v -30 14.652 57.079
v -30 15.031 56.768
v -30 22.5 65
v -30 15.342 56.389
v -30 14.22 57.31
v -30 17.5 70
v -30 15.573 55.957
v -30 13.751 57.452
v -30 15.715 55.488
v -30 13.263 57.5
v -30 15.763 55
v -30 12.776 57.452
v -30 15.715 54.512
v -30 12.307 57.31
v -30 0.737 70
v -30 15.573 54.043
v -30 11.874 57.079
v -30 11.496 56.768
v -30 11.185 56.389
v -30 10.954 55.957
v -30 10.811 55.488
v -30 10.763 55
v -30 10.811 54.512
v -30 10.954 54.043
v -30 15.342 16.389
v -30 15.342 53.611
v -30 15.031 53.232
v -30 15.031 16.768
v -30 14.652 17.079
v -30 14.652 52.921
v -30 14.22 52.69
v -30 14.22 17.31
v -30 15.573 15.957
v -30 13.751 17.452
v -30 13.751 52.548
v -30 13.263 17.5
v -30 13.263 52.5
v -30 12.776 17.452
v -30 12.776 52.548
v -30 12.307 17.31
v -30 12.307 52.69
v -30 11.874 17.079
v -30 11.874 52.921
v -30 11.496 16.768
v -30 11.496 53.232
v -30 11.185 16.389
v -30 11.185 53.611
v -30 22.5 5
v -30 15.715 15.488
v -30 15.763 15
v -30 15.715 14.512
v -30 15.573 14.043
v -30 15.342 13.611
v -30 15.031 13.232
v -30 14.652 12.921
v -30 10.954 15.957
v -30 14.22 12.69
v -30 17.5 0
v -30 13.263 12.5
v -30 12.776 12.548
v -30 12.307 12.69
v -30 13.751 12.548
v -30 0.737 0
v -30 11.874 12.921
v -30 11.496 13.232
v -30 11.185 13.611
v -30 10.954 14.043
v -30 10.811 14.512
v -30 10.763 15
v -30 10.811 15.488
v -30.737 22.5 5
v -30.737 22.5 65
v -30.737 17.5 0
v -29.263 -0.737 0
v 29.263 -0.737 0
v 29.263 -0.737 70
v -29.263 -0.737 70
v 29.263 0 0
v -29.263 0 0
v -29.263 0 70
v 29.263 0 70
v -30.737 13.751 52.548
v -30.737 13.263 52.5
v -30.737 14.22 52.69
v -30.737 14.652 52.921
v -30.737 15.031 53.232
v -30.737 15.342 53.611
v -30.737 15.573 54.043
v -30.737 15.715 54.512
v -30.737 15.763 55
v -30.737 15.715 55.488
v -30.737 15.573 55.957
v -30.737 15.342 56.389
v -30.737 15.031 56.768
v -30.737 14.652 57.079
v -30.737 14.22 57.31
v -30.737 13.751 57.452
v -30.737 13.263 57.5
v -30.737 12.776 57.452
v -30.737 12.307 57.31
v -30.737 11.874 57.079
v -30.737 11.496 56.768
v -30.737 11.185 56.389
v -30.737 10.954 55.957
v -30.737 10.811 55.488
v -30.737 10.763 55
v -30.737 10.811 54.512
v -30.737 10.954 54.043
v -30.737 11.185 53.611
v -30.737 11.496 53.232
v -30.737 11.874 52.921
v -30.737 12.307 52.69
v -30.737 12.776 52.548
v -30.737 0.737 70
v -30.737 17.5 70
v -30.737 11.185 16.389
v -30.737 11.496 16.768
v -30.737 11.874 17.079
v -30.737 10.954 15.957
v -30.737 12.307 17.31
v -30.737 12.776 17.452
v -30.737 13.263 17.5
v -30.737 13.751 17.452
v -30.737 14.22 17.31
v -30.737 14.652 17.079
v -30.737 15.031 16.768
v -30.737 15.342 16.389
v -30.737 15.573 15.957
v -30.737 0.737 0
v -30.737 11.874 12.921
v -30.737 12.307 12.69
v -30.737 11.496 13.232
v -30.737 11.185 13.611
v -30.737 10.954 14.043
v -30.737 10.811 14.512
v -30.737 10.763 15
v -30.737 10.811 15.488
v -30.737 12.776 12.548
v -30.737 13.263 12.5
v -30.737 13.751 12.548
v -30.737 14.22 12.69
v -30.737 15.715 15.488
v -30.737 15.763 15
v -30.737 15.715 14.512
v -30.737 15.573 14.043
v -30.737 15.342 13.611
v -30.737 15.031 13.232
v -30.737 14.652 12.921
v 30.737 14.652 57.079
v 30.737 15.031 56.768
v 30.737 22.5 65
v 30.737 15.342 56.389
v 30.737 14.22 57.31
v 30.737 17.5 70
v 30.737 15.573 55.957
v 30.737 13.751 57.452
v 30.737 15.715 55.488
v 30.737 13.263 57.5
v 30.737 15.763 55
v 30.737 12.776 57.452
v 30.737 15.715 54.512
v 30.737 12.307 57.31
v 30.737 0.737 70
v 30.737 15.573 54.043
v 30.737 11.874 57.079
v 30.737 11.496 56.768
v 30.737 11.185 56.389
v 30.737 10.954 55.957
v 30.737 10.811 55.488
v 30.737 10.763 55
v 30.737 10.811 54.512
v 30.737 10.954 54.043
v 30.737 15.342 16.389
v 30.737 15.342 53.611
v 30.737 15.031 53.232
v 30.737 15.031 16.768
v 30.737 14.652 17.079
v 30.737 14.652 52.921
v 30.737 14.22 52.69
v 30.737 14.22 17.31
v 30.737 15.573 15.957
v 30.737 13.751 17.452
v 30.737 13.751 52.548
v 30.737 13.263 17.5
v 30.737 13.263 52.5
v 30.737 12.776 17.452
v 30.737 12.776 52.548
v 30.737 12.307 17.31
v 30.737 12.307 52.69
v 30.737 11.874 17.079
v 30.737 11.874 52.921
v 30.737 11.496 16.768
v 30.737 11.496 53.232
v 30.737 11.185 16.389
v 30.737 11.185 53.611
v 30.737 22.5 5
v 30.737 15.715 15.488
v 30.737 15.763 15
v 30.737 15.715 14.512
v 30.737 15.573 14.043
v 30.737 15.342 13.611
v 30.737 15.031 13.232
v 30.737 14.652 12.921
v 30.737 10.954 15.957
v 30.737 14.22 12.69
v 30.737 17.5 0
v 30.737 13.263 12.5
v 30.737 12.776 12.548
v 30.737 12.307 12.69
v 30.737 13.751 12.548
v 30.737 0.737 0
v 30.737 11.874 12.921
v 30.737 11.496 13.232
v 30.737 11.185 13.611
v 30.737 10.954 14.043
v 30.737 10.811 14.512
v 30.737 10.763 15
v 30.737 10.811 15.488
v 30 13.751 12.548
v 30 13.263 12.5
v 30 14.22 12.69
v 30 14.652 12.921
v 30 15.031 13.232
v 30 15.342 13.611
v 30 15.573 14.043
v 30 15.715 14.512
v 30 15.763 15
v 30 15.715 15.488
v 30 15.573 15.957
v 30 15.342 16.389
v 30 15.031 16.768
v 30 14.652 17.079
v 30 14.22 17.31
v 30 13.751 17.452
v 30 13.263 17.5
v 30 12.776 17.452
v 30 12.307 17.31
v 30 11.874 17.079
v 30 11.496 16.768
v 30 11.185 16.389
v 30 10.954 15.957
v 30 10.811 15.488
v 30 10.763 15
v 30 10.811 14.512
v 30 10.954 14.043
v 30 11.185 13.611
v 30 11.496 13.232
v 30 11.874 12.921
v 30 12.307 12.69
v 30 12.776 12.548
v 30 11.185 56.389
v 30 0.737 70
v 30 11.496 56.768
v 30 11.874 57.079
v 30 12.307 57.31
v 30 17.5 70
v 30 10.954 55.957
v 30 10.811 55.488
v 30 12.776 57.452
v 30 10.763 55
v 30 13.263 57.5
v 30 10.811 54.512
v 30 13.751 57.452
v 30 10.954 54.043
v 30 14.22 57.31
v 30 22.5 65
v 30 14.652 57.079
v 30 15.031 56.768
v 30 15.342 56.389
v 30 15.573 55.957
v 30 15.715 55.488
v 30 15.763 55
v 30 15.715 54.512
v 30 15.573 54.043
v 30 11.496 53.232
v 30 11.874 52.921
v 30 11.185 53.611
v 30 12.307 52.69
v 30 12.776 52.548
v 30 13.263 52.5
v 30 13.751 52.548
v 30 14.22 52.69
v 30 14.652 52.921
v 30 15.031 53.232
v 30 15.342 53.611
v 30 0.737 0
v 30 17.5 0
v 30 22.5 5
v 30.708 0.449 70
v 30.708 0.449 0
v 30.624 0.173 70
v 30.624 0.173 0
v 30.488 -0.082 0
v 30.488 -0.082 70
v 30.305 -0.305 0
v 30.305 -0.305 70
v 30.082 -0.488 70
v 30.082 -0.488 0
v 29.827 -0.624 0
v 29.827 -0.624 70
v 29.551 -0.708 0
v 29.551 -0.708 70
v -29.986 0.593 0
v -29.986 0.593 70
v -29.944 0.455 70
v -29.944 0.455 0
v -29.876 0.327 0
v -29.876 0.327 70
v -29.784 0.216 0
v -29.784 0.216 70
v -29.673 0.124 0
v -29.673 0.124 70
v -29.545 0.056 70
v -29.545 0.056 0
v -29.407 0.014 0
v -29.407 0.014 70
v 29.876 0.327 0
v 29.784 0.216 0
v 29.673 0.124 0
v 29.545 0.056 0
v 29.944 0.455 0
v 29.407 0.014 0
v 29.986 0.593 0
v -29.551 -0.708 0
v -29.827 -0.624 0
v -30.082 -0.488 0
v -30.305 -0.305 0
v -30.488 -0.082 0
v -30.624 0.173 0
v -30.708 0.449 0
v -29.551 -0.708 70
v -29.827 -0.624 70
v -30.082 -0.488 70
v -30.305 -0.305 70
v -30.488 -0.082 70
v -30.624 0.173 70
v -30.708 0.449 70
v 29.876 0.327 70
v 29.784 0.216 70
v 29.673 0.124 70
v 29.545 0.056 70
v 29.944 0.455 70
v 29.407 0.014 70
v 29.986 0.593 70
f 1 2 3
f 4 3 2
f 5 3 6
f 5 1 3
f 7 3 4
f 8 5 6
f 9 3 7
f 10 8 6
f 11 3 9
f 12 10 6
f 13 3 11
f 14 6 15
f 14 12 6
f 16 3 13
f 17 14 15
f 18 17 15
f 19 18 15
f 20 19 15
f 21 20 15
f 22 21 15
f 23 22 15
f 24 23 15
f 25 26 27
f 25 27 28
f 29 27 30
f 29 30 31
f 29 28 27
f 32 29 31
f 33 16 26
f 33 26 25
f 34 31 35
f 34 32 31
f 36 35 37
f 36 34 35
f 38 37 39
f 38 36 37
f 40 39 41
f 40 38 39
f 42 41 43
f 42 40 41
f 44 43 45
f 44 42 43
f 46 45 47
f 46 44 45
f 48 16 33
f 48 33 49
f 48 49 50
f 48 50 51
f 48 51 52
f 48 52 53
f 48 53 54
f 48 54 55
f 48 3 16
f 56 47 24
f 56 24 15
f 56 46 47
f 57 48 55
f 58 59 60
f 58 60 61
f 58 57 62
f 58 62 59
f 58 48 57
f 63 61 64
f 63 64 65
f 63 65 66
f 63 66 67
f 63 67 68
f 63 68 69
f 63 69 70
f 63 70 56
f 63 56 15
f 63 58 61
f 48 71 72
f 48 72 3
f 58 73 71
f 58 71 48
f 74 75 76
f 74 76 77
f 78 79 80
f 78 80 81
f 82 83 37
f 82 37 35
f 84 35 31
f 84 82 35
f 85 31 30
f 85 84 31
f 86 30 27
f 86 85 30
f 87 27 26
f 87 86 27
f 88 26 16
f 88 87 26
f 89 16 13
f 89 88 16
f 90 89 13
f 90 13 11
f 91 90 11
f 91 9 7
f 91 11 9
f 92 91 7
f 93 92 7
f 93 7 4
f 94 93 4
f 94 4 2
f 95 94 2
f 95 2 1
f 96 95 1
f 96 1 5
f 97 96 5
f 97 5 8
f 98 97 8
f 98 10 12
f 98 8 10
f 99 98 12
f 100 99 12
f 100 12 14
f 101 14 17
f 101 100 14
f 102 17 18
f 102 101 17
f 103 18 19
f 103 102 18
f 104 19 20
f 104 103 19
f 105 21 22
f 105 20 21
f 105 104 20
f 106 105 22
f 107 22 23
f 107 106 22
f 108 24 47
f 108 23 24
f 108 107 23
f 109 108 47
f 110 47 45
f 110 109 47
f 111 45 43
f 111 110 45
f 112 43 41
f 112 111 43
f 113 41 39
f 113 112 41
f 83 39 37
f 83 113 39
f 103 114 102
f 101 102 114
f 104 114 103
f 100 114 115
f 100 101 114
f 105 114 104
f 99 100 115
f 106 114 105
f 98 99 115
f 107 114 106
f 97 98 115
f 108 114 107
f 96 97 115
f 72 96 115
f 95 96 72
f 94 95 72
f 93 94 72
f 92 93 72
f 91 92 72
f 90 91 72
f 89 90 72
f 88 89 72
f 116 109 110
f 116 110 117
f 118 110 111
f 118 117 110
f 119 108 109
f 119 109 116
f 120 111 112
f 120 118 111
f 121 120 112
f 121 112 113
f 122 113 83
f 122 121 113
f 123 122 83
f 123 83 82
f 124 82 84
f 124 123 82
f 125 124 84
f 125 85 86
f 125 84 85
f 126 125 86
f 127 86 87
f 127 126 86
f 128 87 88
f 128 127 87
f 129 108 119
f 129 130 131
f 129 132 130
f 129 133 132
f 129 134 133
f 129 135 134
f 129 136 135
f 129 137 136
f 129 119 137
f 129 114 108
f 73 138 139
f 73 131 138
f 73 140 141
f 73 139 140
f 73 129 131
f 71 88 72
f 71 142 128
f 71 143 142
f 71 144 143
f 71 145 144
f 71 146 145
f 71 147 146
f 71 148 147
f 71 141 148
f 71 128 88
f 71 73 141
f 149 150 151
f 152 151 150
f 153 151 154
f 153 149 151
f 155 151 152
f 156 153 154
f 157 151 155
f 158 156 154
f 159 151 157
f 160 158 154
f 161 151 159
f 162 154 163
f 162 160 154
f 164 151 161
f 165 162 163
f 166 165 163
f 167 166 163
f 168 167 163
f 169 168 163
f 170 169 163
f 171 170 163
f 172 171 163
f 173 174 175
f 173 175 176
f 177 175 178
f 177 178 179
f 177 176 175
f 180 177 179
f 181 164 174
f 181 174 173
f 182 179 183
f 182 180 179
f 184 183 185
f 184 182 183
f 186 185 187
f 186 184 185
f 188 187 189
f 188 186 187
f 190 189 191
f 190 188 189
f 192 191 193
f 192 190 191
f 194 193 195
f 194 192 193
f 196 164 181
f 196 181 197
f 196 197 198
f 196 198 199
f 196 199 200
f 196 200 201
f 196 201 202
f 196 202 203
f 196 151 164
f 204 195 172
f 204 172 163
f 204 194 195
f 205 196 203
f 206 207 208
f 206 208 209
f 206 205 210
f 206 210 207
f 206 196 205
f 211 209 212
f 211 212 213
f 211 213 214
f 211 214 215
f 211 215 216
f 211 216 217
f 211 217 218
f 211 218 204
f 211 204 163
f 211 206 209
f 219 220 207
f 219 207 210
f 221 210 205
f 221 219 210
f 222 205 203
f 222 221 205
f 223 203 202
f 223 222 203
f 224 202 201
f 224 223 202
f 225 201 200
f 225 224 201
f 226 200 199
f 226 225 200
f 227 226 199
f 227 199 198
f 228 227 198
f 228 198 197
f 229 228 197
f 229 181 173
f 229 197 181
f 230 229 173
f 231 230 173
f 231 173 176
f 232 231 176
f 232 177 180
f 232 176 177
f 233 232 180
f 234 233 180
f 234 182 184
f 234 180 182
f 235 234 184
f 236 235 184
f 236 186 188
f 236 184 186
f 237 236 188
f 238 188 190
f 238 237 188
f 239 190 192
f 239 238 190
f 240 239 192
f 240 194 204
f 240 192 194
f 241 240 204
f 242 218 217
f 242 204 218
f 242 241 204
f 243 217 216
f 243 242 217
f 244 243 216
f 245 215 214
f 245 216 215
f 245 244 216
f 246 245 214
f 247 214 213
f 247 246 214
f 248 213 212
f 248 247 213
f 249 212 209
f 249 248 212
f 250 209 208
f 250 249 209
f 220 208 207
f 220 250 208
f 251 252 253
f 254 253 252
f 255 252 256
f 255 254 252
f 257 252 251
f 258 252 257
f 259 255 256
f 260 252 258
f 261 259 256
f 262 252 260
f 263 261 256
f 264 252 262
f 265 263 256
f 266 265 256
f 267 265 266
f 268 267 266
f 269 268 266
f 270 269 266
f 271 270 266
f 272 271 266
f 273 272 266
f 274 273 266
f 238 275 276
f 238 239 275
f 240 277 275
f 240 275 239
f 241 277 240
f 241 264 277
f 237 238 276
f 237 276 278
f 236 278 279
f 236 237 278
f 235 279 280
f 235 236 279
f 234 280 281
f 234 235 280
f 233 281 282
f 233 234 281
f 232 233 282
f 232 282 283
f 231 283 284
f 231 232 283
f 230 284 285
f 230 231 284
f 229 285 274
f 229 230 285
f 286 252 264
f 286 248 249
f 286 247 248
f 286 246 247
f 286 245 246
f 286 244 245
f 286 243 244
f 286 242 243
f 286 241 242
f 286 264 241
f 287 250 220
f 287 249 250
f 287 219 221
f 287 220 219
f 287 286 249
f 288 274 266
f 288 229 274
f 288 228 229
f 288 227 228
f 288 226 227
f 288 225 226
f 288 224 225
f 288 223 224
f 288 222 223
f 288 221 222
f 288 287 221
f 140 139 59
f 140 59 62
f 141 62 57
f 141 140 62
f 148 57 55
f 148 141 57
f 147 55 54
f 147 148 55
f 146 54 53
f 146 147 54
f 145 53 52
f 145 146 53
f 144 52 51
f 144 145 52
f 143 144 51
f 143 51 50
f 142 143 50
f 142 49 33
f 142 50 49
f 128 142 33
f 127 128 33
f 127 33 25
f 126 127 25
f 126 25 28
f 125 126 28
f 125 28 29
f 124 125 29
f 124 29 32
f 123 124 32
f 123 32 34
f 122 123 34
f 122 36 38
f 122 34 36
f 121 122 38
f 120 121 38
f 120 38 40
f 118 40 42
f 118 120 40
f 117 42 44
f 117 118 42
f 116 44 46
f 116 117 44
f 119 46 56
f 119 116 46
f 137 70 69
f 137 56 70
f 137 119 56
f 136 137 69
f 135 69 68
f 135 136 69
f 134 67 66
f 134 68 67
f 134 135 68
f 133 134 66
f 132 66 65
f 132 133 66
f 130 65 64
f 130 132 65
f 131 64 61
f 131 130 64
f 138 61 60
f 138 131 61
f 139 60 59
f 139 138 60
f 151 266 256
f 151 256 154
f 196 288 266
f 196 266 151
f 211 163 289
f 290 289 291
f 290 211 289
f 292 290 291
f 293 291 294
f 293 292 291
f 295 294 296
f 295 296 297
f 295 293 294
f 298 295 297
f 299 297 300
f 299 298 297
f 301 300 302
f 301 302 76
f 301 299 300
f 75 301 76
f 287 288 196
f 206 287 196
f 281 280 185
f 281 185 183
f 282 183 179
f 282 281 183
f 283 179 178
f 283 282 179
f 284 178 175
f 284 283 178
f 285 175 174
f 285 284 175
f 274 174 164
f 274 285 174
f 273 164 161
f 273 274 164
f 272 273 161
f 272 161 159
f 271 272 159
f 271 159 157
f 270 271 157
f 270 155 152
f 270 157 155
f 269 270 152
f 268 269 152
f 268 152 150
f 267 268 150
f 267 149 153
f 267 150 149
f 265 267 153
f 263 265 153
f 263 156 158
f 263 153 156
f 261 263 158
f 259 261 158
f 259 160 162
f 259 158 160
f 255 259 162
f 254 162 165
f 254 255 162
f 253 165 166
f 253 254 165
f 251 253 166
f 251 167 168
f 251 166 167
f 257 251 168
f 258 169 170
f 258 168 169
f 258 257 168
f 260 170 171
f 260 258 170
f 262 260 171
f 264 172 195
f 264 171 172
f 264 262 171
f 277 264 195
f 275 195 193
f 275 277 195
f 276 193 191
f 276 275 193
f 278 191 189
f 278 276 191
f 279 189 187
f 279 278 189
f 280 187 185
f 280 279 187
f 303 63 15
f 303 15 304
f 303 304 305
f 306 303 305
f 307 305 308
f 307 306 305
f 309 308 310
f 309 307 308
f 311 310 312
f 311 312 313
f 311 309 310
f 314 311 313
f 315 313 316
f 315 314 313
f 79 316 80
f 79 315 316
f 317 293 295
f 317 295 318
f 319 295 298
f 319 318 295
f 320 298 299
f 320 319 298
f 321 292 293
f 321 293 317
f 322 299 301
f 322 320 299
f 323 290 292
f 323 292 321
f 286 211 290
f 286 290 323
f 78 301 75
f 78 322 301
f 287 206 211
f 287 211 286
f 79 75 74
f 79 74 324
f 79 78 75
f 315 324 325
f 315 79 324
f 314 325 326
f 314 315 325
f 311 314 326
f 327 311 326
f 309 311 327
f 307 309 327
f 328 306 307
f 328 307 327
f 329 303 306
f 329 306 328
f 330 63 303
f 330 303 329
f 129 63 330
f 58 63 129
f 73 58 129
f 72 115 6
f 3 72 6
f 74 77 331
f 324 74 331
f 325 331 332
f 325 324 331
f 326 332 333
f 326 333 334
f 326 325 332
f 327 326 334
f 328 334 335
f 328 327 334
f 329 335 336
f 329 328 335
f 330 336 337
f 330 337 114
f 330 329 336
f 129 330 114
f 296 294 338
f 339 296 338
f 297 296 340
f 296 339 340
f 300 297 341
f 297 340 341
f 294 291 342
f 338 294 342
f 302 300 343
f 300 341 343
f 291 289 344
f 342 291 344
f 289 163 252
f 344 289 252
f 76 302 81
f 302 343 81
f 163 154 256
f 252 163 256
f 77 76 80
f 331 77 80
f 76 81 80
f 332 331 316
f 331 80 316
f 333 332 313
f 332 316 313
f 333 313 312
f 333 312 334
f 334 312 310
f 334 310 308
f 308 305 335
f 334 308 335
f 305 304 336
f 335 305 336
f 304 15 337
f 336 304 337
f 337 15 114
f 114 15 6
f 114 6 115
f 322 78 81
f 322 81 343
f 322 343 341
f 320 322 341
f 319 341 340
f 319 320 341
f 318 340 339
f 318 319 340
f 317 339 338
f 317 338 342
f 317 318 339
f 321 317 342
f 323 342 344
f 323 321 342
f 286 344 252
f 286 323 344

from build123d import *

# Parameters (mm, degrees)
SM_BASE_FLANGE_1_DEPTH   = 70
CUT_EXTRUDE_1_DEPTH      = 80.693089911
CUT_EXTRUDE_1_DEPTH_BACK = 80.693089911
SKETCH_6_R               = 2.5
CHAMFER_1_SIZE           = 5


# Sheet-metal steps are written as plain solids
with BuildPart() as part:
    # Sketch 1 → 基材-凸緣1 (new body)
    with BuildSketch(Plane.XY):
        with BuildLine():
            Line((-30, 22.5), (-30, 0.7366))
            ThreePointArc((-30, 0.7366), (-29.784254855, 0.215745145), (-29.2634, 0))
            Line((-29.2634, 0), (29.2634, 0))
            ThreePointArc((29.2634, 0), (29.784254855, 0.215745145), (30, 0.7366))
            Line((30, 0.7366), (30, 22.5))
            Line((30, 22.5), (30.7366, 22.5))
            Line((30.7366, 22.5), (30.7366, 0.7366))
            ThreePointArc((30.7366, 0.7366), (30.30510971, -0.30510971), (29.2634, -0.7366))
            Line((29.2634, -0.7366), (-29.2634, -0.7366))
            ThreePointArc((-29.2634, -0.7366), (-30.30510971, -0.30510971), (-30.7366, 0.7366))
            Line((-30.7366, 0.7366), (-30.7366, 22.5))
            Line((-30.7366, 22.5), (-30, 22.5))
        make_face()
    extrude(amount=SM_BASE_FLANGE_1_DEPTH)

    # 草圖6 → 除料-伸長1 (cut, two sides: drawn at the far end of the back side and taken through both)
    with BuildSketch(Plane(origin=(0, 0, 0), x_dir=(0, 0, -1), z_dir=(1, 0, 0)).offset(-CUT_EXTRUDE_1_DEPTH_BACK)):
        with Locations((-15, 13.2634)):
            Circle(SKETCH_6_R)
        with Locations((-55, 13.2634)):
            Circle(SKETCH_6_R)
    extrude(amount=CUT_EXTRUDE_1_DEPTH + CUT_EXTRUDE_1_DEPTH_BACK, mode=Mode.SUBTRACT)

    # 導角1
    chamfer_1_edges = [part.edges().sort_by_distance(p)[0] for p in [
        (-30.3683, 22.5, 0),
        (30.3683, 22.5, 0),
        (-30.3683, 22.5, 70),
        (30.3683, 22.5, 70),
    ]]
    chamfer(chamfer_1_edges, length=CHAMFER_1_SIZE)


solid = part.part
